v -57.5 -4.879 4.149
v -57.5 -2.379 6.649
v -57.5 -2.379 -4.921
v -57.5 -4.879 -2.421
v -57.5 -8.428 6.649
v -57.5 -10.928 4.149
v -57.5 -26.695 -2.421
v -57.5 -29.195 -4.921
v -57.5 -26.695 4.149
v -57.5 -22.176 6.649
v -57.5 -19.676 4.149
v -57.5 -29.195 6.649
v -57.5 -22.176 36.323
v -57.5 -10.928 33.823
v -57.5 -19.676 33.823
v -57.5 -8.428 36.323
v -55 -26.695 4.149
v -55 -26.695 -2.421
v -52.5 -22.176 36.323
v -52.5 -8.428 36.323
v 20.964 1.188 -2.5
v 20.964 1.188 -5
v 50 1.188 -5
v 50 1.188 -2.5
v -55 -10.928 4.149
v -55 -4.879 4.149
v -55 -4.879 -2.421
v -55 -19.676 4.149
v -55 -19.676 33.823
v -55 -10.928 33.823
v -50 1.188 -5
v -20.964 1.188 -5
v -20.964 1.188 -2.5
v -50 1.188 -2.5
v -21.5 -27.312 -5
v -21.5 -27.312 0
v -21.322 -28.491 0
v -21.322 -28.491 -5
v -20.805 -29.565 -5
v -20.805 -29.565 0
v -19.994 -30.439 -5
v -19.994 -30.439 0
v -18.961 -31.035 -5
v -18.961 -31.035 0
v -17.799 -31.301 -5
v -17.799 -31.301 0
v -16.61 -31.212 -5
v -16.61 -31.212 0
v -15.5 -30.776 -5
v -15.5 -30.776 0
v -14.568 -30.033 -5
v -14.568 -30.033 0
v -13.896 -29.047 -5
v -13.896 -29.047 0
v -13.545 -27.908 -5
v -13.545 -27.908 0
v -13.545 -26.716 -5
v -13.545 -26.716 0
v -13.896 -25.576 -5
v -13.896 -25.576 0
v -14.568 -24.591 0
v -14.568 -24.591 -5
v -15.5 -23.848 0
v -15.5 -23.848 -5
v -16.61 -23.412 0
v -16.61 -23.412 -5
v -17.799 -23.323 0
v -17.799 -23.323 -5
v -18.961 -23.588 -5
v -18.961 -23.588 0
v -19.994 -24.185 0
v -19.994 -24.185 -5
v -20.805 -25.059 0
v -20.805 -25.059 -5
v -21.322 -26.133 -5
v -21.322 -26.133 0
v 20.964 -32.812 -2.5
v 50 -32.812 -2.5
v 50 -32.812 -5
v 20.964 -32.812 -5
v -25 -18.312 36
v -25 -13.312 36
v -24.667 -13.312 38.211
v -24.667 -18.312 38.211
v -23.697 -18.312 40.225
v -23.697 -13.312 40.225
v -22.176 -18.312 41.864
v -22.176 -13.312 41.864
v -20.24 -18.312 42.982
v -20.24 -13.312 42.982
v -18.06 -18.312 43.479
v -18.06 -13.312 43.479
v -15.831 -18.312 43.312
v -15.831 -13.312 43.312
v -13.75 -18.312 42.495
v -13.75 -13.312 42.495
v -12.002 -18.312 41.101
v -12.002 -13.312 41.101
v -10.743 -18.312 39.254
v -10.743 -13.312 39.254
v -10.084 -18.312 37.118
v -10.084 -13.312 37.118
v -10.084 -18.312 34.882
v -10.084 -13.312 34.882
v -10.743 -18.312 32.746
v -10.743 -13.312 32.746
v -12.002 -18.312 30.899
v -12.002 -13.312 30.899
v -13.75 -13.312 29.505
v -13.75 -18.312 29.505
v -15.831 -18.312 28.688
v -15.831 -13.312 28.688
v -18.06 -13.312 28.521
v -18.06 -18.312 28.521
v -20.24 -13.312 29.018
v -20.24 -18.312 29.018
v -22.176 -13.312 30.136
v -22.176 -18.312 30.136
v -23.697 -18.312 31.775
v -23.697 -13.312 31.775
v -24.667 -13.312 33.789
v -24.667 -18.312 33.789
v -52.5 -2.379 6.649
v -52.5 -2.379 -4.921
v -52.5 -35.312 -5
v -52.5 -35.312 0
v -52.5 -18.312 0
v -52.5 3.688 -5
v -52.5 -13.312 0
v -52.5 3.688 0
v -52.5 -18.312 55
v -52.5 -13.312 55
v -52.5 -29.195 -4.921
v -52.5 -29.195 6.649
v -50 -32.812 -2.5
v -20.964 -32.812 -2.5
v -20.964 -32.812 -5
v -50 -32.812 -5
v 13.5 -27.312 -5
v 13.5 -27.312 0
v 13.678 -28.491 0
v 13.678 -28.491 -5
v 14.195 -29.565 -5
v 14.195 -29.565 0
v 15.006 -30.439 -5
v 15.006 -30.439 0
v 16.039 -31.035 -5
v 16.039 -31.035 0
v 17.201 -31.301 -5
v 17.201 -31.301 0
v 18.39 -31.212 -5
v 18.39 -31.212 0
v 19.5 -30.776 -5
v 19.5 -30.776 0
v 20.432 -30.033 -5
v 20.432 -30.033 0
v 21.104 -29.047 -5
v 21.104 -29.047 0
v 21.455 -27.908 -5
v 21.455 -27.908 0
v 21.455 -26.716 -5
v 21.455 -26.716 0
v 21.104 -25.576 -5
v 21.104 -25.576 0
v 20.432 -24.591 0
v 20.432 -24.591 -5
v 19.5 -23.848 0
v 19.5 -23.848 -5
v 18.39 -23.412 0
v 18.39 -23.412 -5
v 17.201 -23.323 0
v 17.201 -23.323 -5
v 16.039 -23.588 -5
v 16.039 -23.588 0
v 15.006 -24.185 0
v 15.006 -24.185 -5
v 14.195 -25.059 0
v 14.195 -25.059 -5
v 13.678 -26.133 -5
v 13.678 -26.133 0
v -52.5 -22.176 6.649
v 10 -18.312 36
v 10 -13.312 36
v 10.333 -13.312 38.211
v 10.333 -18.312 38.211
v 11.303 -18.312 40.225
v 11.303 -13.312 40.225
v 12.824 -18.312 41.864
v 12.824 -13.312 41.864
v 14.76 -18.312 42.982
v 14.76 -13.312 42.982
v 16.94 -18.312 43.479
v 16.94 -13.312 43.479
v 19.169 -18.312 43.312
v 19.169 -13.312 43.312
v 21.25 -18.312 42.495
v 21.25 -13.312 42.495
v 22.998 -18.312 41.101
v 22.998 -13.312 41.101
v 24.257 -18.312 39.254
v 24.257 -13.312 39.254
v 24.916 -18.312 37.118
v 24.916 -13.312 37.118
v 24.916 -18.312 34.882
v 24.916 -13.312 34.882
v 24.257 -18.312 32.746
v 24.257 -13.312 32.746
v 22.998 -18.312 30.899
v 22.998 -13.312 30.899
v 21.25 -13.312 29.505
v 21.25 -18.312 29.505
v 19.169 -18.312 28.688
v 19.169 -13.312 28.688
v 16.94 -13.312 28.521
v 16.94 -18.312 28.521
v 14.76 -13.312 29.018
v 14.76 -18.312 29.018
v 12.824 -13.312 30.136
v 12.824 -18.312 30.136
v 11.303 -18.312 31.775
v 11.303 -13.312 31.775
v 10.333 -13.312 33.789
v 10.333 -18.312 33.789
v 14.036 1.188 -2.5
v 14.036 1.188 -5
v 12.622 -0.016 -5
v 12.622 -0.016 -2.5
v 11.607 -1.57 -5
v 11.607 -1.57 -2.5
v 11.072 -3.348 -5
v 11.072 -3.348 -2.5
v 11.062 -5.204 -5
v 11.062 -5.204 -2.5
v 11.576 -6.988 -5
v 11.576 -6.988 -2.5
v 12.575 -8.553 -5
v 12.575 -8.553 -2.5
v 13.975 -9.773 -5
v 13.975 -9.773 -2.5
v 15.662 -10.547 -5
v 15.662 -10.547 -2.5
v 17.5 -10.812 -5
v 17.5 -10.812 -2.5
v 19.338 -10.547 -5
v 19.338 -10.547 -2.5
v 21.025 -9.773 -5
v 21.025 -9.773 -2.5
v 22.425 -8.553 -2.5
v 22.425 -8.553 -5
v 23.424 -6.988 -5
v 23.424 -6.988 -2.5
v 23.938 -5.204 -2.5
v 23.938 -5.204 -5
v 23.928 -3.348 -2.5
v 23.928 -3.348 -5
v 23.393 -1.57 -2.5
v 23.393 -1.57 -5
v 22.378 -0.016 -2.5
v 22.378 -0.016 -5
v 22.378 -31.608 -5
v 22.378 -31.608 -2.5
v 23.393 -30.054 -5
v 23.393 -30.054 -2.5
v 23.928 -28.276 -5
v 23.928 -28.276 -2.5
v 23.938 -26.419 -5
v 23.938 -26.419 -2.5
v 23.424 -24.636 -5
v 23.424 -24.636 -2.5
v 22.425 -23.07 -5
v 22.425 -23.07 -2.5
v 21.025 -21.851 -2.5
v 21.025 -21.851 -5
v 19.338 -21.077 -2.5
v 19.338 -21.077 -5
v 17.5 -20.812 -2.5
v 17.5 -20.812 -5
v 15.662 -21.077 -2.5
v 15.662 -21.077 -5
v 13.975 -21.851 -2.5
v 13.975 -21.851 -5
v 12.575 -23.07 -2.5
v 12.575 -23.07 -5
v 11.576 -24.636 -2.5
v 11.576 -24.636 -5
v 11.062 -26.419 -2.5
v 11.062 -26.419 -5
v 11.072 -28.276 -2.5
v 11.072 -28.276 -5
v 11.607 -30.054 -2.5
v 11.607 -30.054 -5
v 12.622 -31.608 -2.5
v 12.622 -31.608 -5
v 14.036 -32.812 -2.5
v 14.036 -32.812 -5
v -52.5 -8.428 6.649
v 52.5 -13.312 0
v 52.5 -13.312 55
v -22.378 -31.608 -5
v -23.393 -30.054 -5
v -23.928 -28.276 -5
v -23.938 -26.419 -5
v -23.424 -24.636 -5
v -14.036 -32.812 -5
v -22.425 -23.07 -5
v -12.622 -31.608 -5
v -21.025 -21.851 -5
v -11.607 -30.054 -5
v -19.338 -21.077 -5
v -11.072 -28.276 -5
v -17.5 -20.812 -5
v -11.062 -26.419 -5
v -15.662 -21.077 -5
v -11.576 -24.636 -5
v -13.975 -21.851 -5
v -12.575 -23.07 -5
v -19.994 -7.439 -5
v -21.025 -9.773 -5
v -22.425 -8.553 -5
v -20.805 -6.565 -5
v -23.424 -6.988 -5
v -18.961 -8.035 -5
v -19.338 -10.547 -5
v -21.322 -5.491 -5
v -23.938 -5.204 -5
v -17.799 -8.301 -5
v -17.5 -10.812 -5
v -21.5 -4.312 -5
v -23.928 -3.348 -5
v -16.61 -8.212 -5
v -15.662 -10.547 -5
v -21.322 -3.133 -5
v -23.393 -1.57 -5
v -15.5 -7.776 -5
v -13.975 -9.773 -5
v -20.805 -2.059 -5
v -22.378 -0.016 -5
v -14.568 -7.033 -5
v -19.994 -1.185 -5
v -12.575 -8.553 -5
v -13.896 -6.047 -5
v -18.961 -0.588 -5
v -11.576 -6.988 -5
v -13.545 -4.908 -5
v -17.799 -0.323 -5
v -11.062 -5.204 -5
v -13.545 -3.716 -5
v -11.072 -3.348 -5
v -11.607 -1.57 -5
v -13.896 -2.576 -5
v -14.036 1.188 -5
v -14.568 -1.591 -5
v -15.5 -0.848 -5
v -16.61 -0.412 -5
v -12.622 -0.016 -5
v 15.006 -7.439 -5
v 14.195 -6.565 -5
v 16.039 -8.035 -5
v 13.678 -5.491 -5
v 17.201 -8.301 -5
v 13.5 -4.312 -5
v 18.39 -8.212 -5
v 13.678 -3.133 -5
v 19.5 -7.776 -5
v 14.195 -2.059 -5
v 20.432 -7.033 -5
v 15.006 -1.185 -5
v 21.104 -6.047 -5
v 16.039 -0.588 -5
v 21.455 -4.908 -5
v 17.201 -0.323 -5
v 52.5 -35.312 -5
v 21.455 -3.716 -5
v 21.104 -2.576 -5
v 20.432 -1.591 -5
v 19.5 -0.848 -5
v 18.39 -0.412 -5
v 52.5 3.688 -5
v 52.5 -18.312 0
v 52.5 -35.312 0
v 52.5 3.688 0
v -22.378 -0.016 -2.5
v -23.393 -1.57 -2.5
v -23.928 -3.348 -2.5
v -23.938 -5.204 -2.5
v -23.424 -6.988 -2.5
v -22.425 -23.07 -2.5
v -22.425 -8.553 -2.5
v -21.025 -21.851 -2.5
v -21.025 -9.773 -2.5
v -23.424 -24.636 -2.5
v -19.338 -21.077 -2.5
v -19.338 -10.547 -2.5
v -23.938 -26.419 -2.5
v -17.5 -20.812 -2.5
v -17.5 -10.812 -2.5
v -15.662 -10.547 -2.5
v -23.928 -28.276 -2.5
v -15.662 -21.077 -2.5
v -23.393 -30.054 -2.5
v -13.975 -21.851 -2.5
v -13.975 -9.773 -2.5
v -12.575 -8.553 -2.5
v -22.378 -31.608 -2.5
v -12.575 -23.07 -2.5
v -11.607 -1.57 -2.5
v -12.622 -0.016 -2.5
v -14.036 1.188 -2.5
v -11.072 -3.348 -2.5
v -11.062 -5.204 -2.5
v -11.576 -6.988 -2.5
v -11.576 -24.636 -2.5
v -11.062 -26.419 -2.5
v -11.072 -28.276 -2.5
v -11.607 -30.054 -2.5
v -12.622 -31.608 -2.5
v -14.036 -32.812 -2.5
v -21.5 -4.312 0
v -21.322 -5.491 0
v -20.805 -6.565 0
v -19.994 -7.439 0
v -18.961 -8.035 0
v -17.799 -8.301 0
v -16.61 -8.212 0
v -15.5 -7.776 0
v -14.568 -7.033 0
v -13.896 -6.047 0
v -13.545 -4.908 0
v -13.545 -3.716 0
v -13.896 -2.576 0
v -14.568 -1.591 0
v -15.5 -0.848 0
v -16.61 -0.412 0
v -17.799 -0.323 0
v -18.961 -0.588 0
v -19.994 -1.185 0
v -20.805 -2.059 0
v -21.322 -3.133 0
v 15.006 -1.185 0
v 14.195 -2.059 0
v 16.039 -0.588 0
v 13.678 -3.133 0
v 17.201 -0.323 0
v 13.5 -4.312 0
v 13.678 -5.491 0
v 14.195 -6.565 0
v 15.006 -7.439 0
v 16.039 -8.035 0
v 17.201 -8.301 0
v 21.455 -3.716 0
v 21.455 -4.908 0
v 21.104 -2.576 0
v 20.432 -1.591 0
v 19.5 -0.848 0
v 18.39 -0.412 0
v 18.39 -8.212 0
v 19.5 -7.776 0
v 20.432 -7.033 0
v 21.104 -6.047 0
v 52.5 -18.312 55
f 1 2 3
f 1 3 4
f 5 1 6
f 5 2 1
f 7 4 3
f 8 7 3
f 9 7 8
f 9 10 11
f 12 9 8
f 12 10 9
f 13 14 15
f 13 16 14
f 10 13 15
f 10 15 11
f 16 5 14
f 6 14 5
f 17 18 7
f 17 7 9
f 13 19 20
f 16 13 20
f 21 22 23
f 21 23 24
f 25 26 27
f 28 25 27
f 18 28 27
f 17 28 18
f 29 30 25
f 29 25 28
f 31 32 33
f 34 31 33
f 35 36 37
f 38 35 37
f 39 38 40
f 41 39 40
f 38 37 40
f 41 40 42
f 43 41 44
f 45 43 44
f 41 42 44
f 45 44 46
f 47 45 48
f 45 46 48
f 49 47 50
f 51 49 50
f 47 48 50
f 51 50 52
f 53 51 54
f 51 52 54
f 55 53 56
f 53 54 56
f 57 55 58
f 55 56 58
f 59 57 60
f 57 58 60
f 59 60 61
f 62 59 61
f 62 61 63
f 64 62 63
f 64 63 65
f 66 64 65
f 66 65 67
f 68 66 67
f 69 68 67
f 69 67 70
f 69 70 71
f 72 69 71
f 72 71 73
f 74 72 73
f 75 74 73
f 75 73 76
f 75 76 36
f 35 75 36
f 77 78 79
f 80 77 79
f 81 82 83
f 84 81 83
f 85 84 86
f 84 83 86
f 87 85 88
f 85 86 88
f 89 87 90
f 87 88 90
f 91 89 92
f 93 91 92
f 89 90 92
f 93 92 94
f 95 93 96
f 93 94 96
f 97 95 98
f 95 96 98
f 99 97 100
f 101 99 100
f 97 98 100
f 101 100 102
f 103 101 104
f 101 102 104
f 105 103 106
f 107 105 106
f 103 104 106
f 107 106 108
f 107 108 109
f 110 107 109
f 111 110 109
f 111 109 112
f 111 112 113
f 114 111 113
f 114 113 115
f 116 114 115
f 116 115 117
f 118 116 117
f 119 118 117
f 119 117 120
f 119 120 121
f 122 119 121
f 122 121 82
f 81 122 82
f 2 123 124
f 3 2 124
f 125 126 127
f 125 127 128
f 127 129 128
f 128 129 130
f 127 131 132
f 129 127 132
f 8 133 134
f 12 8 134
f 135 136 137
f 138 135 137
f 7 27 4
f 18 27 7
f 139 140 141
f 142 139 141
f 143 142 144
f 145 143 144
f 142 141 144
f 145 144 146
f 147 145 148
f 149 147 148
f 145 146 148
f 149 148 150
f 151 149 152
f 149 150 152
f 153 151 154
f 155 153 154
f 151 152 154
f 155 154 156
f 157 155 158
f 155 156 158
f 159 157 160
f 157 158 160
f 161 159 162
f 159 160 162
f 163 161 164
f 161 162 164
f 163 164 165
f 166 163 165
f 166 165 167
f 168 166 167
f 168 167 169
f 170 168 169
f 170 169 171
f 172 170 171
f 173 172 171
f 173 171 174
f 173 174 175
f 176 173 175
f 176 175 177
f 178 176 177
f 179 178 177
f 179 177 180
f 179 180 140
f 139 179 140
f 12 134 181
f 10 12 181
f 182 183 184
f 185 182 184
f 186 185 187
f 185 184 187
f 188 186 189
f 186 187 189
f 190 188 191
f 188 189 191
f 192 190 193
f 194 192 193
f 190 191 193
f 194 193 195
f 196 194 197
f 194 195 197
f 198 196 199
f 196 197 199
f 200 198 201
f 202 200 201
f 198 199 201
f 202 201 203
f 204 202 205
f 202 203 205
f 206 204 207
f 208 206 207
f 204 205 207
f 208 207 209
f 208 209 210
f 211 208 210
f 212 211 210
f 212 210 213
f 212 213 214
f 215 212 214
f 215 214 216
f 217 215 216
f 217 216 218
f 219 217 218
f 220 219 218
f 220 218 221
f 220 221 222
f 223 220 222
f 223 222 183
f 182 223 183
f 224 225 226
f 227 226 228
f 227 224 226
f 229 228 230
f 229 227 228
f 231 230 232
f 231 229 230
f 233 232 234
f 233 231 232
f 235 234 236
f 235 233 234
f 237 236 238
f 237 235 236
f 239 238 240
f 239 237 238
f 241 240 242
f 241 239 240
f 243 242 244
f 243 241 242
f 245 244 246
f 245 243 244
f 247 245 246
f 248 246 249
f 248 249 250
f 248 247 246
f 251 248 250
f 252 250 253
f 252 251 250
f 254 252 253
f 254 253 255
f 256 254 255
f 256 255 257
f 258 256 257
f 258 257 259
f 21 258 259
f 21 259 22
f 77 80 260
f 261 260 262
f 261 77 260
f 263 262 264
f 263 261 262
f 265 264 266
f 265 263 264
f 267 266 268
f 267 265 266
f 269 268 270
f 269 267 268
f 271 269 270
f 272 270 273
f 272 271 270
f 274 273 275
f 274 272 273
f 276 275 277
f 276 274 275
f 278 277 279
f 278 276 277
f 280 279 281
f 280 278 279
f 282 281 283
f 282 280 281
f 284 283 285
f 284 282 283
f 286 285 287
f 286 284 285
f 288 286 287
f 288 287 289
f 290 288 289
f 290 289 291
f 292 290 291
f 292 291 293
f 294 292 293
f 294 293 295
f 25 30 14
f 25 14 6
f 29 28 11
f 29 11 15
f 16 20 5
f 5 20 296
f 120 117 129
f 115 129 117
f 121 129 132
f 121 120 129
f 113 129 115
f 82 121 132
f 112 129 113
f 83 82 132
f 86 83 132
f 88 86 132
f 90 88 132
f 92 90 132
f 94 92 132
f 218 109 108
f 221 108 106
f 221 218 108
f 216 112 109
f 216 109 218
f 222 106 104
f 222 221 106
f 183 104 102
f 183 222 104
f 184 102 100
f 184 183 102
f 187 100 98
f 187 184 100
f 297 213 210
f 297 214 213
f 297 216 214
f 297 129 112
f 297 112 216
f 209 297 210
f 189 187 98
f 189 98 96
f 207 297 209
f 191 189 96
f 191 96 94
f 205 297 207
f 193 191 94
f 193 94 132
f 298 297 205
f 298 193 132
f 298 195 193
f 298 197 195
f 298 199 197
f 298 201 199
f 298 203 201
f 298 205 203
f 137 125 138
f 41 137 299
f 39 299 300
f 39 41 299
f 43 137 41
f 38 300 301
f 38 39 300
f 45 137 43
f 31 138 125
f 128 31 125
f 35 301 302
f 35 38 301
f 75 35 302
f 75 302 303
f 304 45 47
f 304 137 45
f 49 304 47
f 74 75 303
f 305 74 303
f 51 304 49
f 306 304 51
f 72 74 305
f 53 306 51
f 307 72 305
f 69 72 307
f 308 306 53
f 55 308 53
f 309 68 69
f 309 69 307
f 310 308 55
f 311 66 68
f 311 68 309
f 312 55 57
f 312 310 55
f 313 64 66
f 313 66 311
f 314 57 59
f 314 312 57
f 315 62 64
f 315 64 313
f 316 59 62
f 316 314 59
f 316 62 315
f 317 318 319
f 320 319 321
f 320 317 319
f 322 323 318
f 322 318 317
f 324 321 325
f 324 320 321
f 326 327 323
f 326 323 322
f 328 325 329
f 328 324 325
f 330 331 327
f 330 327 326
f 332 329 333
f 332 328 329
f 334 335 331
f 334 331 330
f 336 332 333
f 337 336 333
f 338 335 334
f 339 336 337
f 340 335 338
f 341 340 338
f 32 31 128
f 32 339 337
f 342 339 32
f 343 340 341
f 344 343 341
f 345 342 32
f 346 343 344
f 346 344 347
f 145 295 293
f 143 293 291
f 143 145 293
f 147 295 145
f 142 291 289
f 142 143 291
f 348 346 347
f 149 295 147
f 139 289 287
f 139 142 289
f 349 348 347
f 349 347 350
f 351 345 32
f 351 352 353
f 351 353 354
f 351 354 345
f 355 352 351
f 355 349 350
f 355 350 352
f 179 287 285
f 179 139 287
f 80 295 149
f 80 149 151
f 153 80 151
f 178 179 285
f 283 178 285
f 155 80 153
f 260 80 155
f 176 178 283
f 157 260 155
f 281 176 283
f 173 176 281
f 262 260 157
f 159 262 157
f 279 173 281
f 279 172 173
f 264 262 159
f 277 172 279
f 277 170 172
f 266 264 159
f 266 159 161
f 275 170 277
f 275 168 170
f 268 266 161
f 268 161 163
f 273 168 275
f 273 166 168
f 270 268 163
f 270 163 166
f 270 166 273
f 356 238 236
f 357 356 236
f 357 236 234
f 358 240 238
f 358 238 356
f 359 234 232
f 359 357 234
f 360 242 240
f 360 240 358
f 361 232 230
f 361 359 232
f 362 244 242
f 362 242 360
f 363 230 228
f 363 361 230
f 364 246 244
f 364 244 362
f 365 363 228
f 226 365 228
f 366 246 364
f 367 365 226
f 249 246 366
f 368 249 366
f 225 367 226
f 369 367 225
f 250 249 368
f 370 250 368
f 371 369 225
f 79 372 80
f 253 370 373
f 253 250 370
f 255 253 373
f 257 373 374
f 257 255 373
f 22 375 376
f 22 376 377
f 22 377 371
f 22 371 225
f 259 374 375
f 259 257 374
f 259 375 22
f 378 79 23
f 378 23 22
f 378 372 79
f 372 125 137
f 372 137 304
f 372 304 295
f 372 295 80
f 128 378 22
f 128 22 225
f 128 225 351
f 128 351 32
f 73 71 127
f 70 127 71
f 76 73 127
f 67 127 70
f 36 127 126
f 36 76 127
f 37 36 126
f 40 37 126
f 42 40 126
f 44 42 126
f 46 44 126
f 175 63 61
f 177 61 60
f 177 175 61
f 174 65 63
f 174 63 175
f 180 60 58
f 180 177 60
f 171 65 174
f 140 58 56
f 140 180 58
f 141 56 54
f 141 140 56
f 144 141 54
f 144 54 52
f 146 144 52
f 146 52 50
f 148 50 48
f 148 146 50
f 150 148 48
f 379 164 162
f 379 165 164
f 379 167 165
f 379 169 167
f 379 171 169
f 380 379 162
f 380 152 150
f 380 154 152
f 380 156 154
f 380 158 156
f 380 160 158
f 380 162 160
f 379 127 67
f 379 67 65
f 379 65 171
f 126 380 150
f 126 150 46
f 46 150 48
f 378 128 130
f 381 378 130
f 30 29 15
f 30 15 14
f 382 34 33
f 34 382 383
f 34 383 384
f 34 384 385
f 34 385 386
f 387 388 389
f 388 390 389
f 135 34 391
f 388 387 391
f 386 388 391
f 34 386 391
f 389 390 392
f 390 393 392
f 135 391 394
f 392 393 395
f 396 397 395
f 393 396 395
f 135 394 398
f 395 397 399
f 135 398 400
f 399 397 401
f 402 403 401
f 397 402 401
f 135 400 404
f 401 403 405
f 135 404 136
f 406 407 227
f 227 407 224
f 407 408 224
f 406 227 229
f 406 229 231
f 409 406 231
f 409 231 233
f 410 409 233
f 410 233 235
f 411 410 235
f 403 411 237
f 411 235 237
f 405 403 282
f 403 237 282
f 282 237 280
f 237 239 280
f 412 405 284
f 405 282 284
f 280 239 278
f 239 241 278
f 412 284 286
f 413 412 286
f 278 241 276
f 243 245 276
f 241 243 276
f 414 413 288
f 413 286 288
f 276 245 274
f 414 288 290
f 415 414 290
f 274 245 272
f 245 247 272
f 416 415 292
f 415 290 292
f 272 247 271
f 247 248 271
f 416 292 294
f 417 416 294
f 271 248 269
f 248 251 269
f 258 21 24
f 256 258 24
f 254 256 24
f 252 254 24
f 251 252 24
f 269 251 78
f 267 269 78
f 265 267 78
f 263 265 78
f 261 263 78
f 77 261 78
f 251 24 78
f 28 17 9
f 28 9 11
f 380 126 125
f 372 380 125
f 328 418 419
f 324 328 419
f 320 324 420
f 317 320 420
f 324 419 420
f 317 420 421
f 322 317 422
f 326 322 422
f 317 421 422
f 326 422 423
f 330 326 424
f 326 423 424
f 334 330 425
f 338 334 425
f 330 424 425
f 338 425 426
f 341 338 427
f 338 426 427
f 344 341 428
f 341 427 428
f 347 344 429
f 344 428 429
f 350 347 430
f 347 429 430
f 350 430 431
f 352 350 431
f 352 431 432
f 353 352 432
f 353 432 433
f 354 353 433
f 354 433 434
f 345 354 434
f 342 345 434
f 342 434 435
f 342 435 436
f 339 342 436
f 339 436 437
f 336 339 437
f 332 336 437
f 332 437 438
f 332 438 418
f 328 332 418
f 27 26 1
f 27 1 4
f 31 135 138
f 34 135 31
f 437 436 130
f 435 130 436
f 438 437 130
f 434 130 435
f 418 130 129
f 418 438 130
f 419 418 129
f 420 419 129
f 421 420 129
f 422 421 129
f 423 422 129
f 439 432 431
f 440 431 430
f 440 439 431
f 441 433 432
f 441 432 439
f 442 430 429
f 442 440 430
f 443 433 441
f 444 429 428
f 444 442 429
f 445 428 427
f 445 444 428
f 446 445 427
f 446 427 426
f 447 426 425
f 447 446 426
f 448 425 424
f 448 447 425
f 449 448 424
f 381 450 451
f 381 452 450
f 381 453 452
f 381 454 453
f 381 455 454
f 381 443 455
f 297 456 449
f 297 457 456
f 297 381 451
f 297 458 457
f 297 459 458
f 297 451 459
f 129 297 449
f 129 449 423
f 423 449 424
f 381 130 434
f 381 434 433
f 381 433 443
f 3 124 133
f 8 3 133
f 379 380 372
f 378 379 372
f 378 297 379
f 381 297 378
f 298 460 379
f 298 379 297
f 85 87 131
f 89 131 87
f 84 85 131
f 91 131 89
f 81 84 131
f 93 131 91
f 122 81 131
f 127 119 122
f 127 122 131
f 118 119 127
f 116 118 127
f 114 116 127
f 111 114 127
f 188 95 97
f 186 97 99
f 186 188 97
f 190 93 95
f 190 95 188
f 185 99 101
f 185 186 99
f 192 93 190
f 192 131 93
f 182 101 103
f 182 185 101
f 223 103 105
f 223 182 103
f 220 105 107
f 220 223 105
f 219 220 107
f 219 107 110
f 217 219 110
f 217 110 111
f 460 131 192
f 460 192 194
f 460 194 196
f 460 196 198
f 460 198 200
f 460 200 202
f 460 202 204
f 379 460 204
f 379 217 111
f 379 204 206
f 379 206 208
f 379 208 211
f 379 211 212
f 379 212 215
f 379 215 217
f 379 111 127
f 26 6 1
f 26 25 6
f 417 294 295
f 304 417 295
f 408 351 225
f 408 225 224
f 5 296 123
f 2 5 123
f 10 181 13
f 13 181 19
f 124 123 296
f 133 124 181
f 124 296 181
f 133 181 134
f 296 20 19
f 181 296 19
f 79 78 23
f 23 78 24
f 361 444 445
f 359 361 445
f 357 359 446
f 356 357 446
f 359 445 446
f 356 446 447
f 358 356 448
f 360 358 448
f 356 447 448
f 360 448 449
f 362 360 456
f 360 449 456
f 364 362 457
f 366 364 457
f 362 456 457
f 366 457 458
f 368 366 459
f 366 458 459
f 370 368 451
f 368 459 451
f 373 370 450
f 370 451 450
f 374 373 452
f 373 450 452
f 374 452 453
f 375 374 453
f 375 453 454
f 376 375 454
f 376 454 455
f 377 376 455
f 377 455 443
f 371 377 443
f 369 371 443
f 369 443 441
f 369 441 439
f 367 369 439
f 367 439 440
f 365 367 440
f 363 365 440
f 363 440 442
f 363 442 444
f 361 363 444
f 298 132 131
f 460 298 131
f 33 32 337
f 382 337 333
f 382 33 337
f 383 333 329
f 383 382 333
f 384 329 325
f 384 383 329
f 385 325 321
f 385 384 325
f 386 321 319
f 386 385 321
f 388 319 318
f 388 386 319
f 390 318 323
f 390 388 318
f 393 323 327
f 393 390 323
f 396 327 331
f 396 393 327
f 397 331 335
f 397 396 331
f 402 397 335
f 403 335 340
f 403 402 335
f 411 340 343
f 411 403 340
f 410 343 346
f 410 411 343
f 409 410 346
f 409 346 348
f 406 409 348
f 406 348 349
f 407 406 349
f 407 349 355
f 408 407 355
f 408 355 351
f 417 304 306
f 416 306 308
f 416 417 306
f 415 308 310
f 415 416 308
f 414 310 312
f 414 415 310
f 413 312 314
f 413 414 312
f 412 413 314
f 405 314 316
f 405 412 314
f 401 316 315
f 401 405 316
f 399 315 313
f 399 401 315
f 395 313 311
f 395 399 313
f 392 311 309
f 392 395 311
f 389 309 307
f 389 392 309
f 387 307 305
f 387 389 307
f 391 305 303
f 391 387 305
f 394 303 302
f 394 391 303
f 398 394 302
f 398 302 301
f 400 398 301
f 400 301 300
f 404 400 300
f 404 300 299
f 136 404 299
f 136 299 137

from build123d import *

# Parameters (mm, degrees)
F1_DEPTH     = 52.5
F3_D         = 8
F6_D         = 15
F8_DEPTH     = 5
F9_T         = -2.5
F10_T        = 2.5
F10_T3_DEPTH = 110


# Not quite as in the source:
# - a shell that OpenCascade refuses in one call is made with other operations: the cavity is built on its own and cut out


with BuildPart() as f1:
    # F0 (on Right) → F1 (new body, symmetric)
    with BuildSketch(Plane.YZ):
        Polygon((-13.3118266579, 0), (-13.3118266579, 55), (-18.3118266579, 55), (-18.3118266579, 0), (-35.3118266579, 0), (-35.3118266579, -5), (-13.3118266579, -5), (3.6881733421, -5), (3.6881733421, 0), align=None)
    extrude(amount=F1_DEPTH, both=True)

    # F3 (through all)
    with Locations(Plane(origin=(0, 0, -5), x_dir=(1, 0, 0), z_dir=(0, 0, -1))):
        with Locations((-17.5, 27.3118266579), (17.5, 27.3118266579), (-17.5, 4.3118266579), (17.5, 4.3118266579)):
            Hole(F3_D / 2)

    # F6 (through all)
    with Locations(Plane.XZ.offset(18.3118266579)):
        with Locations((17.5, 36), (-17.5, 36)):
            Hole(F6_D / 2)

    # F10: shell of thickness 2.5, made by hand


with BuildPart() as f8:
    # F7 (on offset) → F8 (new body)
    with BuildSketch(Plane(origin=(-52.5, 0, 0), x_dir=(0, -1, 0), z_dir=(-1, 0, 0))):
        Polygon((2.3793176152, 6.649301853), (2.3793176152, -4.9209868232), (29.1948146988, -4.9209868232), (29.1948146988, 6.649301853), (22.175675258, 6.649301853), (22.175675258, 36.3233052194), (8.4276301786, 36.3233052194), (8.4276301786, 6.649301853), align=None)
    extrude(amount=F8_DEPTH)

    # F9
    f9_openings = [f8.faces().sort_by_distance(p)[0] for p in [
        (-57.5, -15.511345, 12.577798),
    ]]
    offset(amount=F9_T, openings=f9_openings, kind=Kind.INTERSECTION)


with BuildPart() as f10_core1:
    # F10_t2: copy of F1
    add(f1.part)

    # the walls: a layer under each face that stays
    f10_faces = [f10_core1.faces().sort_by_distance(p)[0] for p in [
        (0, -4.8118266579, 0),
        (-52.5, -15.8118266579, 25),
        (0, 3.6881733421, -2.5),
        (0, -13.3118266579, 27.5),
        (52.5, -15.8118266579, 25),
        (-21.5, -4.3118266579, -2.5),
        (13.5, -4.3118266579, -2.5),
        (0, -15.8118266579, 55),
        (0, -18.3118266579, 27.5),
        (0, -26.8118266579, 0),
        (0, -35.3118266579, -2.5),
        (-25, -15.8118266579, 36),
        (10, -15.8118266579, 36),
        (-21.5, -27.3118266579, -2.5),
        (13.5, -27.3118266579, -2.5),
    ]]
    thicken(f10_faces, amount=-F10_T, mode=Mode.SUBTRACT)

    # F10_s4 → F10_t3 (cut)
    with BuildSketch(Plane.YZ.offset(-55)):
        Polygon((-13.2868266579, 0.025), (-13.3118266579, -2.5), (-15.8118266579, -2.5), (-15.8118266579, 0), align=None)
        Polygon((-18.3368266579, 0.025), (-15.8118266579, 0), (-15.8118266579, -2.5), (-18.3118266579, -2.5), align=None)
    extrude(amount=F10_T3_DEPTH, mode=Mode.SUBTRACT)


with BuildPart() as f1_1:
    add(f1.part)

    # what is left inside the walls is the cavity
    f10_cavity = [f10_core1.part.solids().sort_by_distance(p)[0] for p in [
        (-16.666667, -15.811827, -4.975),
    ]]
    add(f10_cavity, mode=Mode.SUBTRACT)


solid = Compound([f8.part, f1_1.part])
